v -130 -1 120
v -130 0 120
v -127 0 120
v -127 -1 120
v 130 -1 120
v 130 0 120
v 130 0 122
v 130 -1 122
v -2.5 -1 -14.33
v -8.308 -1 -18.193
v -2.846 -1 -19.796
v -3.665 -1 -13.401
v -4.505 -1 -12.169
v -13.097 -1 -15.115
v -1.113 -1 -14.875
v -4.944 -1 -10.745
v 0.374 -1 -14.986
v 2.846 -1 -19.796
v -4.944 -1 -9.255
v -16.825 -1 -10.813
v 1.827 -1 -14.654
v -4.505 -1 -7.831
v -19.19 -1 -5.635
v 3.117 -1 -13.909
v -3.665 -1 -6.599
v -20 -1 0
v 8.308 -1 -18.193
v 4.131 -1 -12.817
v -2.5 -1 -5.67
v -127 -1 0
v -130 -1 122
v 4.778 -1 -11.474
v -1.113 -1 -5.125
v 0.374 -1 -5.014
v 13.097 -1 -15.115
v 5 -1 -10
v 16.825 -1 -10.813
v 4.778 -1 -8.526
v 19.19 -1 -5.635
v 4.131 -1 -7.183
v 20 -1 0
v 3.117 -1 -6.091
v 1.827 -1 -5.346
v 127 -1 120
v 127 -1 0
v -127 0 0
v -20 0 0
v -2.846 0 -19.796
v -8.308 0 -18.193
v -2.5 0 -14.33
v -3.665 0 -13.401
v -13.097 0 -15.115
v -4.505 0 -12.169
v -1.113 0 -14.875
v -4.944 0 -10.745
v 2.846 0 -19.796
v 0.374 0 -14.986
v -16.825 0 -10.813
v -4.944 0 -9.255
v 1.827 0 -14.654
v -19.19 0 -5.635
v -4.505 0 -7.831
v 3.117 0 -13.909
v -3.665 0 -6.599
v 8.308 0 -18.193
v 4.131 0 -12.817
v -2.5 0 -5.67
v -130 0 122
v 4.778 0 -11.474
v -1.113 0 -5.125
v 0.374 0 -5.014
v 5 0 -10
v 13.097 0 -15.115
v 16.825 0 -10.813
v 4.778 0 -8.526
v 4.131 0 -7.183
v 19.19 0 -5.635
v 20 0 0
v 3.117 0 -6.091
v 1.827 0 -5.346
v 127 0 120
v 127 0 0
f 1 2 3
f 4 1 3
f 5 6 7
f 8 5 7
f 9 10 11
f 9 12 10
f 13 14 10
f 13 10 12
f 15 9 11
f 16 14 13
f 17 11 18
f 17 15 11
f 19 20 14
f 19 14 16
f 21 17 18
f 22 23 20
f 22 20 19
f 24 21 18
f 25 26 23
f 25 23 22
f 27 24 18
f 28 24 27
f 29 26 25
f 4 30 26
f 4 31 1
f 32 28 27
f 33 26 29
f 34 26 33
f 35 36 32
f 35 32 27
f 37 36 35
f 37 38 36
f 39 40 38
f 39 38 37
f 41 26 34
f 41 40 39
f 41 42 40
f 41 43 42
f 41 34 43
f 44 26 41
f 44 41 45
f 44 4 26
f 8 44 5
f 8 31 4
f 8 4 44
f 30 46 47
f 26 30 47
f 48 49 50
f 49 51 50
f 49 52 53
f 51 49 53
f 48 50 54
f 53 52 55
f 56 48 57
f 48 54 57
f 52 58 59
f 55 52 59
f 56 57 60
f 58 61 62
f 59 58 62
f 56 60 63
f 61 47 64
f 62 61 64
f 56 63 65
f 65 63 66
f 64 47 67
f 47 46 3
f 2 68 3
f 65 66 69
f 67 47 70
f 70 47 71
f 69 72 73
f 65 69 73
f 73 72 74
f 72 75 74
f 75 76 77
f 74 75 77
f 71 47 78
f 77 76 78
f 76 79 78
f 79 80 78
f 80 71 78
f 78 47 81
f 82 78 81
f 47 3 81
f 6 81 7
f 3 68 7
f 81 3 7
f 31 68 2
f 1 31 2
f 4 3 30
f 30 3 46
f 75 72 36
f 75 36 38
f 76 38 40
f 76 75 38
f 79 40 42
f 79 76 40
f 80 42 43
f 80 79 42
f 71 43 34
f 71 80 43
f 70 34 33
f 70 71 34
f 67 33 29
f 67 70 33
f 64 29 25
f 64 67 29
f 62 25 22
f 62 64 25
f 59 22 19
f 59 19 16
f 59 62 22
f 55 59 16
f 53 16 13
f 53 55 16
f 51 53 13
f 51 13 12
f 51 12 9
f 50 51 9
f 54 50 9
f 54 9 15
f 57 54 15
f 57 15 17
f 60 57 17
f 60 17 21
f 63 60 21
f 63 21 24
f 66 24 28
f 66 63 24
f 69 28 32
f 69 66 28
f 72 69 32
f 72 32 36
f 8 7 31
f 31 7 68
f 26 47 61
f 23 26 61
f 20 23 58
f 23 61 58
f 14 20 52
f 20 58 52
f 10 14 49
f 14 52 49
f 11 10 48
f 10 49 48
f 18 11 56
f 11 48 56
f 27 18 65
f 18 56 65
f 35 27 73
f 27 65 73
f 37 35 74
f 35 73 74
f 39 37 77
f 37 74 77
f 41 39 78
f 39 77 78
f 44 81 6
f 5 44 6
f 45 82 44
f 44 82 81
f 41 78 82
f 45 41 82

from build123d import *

# Parameters (mm, degrees)
F0_R     = 5
F1_DEPTH = 1


with BuildPart() as f1:
    # F0 (on Front) → F1 (new body)
    with BuildSketch(Plane.XZ):
        with BuildLine():
            Line((-130, 120), (-127, 120))
            Line((-127, 120), (-127, 0))
            Line((-127, 0), (-20, 0))
            ThreePointArc((-20, 0), (0, -20), (20, 0))
            Line((20, 0), (127, 0))
            Line((127, 0), (127, 120))
            Line((127, 120), (130, 120))
            Line((130, 120), (130, 122))
            Line((130, 122), (-130, 122))
            Line((-130, 122), (-130, 120))
        make_face()
        with Locations((0, -10)):
            Circle(F0_R, mode=Mode.SUBTRACT)
    extrude(amount=F1_DEPTH)


solid = f1.part
